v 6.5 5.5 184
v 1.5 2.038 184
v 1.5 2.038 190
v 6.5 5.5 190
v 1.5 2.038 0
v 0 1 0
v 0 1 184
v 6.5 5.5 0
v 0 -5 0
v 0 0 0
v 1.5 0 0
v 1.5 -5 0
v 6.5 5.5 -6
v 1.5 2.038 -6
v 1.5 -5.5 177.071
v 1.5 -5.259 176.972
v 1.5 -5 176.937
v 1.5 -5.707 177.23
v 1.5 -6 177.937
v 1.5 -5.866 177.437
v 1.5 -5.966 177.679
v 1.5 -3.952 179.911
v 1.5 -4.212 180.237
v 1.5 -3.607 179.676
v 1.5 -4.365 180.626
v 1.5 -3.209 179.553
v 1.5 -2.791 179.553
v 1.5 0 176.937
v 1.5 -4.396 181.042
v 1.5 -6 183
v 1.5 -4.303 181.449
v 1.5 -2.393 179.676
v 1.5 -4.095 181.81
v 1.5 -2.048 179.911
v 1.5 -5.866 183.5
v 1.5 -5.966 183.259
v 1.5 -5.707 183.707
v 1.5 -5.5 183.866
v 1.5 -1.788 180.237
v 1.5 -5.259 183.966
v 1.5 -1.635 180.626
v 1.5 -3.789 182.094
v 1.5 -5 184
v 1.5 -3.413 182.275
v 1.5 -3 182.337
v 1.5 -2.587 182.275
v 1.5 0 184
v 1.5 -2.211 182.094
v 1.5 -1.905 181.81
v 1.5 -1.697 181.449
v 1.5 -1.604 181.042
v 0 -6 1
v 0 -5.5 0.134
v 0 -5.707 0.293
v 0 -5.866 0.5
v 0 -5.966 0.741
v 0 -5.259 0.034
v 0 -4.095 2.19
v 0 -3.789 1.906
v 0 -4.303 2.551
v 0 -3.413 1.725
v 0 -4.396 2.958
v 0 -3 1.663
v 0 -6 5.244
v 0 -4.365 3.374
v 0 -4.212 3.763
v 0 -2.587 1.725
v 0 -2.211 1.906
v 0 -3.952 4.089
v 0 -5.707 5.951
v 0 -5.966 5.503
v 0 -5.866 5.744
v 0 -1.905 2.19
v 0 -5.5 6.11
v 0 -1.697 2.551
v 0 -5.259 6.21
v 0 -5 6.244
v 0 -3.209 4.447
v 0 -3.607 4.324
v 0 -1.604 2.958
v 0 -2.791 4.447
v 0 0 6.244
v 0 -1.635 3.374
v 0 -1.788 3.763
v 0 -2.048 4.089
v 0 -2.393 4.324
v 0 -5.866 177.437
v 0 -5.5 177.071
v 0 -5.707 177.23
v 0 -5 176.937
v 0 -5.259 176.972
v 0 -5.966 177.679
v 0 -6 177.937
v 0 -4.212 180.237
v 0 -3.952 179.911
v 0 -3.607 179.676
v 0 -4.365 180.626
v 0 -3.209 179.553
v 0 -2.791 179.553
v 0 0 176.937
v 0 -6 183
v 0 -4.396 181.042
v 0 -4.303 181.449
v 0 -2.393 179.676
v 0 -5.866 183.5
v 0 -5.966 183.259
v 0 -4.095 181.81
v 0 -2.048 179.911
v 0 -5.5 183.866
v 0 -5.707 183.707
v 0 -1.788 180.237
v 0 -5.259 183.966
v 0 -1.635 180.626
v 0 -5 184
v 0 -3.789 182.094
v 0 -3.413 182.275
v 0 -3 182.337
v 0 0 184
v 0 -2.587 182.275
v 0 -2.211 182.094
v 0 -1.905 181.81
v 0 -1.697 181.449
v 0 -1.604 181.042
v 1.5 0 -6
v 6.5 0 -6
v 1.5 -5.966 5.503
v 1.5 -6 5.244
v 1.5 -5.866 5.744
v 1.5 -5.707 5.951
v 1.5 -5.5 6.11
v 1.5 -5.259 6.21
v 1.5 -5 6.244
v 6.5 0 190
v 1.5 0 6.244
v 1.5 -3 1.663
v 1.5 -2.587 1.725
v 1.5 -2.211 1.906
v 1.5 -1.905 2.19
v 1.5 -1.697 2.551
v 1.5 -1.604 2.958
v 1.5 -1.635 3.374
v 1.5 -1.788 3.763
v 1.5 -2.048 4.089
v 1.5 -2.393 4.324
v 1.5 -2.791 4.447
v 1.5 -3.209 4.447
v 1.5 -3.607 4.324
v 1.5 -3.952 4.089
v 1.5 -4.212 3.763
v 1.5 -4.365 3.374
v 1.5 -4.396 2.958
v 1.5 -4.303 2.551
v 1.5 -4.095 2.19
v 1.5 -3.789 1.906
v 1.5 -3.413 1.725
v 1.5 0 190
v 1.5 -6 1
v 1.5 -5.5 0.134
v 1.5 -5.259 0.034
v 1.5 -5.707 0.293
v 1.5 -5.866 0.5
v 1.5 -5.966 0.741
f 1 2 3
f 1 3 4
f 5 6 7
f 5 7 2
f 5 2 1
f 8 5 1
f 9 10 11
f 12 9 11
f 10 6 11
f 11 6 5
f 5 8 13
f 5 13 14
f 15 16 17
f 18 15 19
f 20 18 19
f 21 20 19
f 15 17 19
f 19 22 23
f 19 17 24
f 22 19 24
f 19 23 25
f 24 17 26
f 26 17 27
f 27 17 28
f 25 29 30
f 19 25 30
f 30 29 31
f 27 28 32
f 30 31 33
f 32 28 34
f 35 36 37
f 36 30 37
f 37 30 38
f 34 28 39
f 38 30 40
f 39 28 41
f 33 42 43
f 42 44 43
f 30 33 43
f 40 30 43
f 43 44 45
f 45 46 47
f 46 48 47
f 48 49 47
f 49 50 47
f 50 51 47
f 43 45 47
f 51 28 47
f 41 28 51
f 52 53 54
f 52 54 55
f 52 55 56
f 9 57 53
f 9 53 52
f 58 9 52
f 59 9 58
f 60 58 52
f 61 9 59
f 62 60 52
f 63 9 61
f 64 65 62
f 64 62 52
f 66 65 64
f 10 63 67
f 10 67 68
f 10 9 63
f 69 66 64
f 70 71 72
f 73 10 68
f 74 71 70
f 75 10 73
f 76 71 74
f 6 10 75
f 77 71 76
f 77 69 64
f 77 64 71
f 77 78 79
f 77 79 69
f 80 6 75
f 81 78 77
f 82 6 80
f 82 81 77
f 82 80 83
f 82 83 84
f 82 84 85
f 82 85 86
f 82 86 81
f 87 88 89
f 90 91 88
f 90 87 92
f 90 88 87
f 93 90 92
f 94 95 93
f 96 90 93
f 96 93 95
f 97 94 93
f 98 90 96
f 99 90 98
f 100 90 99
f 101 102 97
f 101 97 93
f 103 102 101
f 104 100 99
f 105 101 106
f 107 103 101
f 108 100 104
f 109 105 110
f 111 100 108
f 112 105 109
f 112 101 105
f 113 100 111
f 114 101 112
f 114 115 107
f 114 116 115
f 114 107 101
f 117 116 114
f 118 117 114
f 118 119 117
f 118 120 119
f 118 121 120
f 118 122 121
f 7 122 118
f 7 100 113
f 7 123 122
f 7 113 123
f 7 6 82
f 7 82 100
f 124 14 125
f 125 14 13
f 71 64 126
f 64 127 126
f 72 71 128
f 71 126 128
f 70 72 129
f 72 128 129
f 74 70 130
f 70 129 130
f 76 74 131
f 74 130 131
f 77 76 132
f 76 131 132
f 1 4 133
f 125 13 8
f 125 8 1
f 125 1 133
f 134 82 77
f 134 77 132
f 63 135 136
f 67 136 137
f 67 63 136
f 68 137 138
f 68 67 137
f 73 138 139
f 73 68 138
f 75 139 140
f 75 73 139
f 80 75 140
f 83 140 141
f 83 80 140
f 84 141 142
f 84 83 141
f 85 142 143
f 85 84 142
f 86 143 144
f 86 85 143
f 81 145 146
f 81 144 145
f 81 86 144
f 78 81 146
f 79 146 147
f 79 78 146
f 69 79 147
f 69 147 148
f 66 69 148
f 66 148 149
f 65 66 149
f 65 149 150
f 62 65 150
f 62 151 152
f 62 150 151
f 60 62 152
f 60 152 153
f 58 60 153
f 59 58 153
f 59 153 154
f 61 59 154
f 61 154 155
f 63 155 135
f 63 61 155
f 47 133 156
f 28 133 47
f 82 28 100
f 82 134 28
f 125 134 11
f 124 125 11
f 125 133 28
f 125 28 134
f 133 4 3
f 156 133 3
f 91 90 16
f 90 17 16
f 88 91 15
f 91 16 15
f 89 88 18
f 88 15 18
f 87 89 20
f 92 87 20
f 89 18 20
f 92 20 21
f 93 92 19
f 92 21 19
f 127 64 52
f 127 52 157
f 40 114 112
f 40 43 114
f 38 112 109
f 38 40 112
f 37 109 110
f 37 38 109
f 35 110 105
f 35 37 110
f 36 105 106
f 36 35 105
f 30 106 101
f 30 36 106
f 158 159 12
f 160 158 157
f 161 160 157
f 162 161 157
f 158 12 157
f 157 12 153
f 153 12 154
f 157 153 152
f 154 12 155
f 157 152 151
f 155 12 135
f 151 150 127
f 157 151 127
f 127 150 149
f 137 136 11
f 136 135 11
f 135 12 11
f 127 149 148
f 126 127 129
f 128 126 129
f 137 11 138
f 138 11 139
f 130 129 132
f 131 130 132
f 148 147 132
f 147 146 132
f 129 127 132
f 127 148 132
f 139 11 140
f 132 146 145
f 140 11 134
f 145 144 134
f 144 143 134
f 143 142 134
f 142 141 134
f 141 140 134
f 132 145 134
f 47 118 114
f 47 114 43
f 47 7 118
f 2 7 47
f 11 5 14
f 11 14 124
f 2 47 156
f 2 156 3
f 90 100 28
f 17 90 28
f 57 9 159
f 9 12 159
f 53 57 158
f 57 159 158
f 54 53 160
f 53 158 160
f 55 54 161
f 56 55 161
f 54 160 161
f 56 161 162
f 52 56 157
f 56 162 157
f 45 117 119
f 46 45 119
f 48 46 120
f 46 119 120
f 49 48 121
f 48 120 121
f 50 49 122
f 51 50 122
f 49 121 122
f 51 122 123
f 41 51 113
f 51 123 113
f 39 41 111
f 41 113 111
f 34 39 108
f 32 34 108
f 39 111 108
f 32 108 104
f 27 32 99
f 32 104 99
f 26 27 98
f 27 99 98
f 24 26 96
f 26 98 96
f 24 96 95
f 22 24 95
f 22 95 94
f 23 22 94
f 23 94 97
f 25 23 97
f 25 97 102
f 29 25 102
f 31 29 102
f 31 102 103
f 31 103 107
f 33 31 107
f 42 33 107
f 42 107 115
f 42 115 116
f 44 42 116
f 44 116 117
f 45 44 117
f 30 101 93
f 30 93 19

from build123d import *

# Parameters (mm, degrees)
SKETCH1_W           = 6.5
SKETCH1_H           = 5.5
BOSS_EXTRUDE1_DEPTH = 184
CUT_EXTRUDE2_DEPTH  = 185
SKETCH3_W           = 1.5
SKETCH3_H           = 6.243718407
SKETCH3_H_2         = 7.062553001
BOSS_EXTRUDE2_DEPTH = 6
SKETCH4_R           = 1.4
CUT_EXTRUDE3_DEPTH  = 7.5
FILLET1_R           = 1
BOSS_EXTRUDE3_DEPTH = 6
BOSS_EXTRUDE4_DEPTH = 6


with BuildPart() as part:
    # Sketch1 → Boss-Extrude1 (new body)
    with BuildSketch(Plane.XY):
        with Locations((3.25, 2.75)):
            Rectangle(SKETCH1_W, SKETCH1_H)
    extrude(amount=BOSS_EXTRUDE1_DEPTH)

    # Sketch2 → Cut-Extrude2 (cut, through all)
    with BuildSketch(Plane(origin=(0, 0, 0), x_dir=(-1, 0, 0), z_dir=(0, 0, -1))):
        Polygon((0, 1), (-6.5, 5.5), (0, 5.5), align=None)
    extrude(amount=-CUT_EXTRUDE2_DEPTH, mode=Mode.SUBTRACT)

    # Sketch3 → Boss-Extrude2 (add)
    with BuildSketch(Plane.XZ):
        with Locations((0.75, 3.121859204)):
            Rectangle(SKETCH3_W, SKETCH3_H)
        with Locations((0.75, 180.4687235)):
            Rectangle(SKETCH3_W, SKETCH3_H_2)
    extrude(amount=BOSS_EXTRUDE2_DEPTH)

    # Sketch4 → Cut-Extrude3 (cut, through all)
    with BuildSketch(Plane.ZY):
        with Locations((180.937446999, -3)):
            Circle(SKETCH4_R)
    cut_extrude3 = extrude(amount=-CUT_EXTRUDE3_DEPTH, mode=Mode.SUBTRACT)

    # Mirror1: Cut-Extrude3 across plane
    add(cut_extrude3.mirror(Plane.XY.offset(92)), mode=Mode.SUBTRACT)

    # Fillet1
    fillet1_edges = [part.edges().sort_by_distance(p)[0] for p in [
        (0.75, -6, 6.243718407),
        (0.75, -6, 0),
        (0.75, -6, 184),
        (0.75, -6, 176.937446999),
    ]]
    fillet(fillet1_edges, radius=FILLET1_R)

    # Sketch5 → Boss-Extrude3 (add)
    with BuildSketch(Plane(origin=(0, 0, 0), x_dir=(-1, 0, 0), z_dir=(0, 0, -1))):
        Polygon((-6.5, 0), (-6.5, 5.5), (-1.5, 2.038461538), (-1.5, 0), align=None)
    extrude(amount=BOSS_EXTRUDE3_DEPTH)

    # Sketch6 → Boss-Extrude4 (add)
    with BuildSketch(Plane.XY.offset(184)):
        Polygon((6.5, 5.5), (6.5, 0), (1.5, 0), (1.5, 2.038461538), align=None)
    extrude(amount=BOSS_EXTRUDE4_DEPTH)


solid = part.part
